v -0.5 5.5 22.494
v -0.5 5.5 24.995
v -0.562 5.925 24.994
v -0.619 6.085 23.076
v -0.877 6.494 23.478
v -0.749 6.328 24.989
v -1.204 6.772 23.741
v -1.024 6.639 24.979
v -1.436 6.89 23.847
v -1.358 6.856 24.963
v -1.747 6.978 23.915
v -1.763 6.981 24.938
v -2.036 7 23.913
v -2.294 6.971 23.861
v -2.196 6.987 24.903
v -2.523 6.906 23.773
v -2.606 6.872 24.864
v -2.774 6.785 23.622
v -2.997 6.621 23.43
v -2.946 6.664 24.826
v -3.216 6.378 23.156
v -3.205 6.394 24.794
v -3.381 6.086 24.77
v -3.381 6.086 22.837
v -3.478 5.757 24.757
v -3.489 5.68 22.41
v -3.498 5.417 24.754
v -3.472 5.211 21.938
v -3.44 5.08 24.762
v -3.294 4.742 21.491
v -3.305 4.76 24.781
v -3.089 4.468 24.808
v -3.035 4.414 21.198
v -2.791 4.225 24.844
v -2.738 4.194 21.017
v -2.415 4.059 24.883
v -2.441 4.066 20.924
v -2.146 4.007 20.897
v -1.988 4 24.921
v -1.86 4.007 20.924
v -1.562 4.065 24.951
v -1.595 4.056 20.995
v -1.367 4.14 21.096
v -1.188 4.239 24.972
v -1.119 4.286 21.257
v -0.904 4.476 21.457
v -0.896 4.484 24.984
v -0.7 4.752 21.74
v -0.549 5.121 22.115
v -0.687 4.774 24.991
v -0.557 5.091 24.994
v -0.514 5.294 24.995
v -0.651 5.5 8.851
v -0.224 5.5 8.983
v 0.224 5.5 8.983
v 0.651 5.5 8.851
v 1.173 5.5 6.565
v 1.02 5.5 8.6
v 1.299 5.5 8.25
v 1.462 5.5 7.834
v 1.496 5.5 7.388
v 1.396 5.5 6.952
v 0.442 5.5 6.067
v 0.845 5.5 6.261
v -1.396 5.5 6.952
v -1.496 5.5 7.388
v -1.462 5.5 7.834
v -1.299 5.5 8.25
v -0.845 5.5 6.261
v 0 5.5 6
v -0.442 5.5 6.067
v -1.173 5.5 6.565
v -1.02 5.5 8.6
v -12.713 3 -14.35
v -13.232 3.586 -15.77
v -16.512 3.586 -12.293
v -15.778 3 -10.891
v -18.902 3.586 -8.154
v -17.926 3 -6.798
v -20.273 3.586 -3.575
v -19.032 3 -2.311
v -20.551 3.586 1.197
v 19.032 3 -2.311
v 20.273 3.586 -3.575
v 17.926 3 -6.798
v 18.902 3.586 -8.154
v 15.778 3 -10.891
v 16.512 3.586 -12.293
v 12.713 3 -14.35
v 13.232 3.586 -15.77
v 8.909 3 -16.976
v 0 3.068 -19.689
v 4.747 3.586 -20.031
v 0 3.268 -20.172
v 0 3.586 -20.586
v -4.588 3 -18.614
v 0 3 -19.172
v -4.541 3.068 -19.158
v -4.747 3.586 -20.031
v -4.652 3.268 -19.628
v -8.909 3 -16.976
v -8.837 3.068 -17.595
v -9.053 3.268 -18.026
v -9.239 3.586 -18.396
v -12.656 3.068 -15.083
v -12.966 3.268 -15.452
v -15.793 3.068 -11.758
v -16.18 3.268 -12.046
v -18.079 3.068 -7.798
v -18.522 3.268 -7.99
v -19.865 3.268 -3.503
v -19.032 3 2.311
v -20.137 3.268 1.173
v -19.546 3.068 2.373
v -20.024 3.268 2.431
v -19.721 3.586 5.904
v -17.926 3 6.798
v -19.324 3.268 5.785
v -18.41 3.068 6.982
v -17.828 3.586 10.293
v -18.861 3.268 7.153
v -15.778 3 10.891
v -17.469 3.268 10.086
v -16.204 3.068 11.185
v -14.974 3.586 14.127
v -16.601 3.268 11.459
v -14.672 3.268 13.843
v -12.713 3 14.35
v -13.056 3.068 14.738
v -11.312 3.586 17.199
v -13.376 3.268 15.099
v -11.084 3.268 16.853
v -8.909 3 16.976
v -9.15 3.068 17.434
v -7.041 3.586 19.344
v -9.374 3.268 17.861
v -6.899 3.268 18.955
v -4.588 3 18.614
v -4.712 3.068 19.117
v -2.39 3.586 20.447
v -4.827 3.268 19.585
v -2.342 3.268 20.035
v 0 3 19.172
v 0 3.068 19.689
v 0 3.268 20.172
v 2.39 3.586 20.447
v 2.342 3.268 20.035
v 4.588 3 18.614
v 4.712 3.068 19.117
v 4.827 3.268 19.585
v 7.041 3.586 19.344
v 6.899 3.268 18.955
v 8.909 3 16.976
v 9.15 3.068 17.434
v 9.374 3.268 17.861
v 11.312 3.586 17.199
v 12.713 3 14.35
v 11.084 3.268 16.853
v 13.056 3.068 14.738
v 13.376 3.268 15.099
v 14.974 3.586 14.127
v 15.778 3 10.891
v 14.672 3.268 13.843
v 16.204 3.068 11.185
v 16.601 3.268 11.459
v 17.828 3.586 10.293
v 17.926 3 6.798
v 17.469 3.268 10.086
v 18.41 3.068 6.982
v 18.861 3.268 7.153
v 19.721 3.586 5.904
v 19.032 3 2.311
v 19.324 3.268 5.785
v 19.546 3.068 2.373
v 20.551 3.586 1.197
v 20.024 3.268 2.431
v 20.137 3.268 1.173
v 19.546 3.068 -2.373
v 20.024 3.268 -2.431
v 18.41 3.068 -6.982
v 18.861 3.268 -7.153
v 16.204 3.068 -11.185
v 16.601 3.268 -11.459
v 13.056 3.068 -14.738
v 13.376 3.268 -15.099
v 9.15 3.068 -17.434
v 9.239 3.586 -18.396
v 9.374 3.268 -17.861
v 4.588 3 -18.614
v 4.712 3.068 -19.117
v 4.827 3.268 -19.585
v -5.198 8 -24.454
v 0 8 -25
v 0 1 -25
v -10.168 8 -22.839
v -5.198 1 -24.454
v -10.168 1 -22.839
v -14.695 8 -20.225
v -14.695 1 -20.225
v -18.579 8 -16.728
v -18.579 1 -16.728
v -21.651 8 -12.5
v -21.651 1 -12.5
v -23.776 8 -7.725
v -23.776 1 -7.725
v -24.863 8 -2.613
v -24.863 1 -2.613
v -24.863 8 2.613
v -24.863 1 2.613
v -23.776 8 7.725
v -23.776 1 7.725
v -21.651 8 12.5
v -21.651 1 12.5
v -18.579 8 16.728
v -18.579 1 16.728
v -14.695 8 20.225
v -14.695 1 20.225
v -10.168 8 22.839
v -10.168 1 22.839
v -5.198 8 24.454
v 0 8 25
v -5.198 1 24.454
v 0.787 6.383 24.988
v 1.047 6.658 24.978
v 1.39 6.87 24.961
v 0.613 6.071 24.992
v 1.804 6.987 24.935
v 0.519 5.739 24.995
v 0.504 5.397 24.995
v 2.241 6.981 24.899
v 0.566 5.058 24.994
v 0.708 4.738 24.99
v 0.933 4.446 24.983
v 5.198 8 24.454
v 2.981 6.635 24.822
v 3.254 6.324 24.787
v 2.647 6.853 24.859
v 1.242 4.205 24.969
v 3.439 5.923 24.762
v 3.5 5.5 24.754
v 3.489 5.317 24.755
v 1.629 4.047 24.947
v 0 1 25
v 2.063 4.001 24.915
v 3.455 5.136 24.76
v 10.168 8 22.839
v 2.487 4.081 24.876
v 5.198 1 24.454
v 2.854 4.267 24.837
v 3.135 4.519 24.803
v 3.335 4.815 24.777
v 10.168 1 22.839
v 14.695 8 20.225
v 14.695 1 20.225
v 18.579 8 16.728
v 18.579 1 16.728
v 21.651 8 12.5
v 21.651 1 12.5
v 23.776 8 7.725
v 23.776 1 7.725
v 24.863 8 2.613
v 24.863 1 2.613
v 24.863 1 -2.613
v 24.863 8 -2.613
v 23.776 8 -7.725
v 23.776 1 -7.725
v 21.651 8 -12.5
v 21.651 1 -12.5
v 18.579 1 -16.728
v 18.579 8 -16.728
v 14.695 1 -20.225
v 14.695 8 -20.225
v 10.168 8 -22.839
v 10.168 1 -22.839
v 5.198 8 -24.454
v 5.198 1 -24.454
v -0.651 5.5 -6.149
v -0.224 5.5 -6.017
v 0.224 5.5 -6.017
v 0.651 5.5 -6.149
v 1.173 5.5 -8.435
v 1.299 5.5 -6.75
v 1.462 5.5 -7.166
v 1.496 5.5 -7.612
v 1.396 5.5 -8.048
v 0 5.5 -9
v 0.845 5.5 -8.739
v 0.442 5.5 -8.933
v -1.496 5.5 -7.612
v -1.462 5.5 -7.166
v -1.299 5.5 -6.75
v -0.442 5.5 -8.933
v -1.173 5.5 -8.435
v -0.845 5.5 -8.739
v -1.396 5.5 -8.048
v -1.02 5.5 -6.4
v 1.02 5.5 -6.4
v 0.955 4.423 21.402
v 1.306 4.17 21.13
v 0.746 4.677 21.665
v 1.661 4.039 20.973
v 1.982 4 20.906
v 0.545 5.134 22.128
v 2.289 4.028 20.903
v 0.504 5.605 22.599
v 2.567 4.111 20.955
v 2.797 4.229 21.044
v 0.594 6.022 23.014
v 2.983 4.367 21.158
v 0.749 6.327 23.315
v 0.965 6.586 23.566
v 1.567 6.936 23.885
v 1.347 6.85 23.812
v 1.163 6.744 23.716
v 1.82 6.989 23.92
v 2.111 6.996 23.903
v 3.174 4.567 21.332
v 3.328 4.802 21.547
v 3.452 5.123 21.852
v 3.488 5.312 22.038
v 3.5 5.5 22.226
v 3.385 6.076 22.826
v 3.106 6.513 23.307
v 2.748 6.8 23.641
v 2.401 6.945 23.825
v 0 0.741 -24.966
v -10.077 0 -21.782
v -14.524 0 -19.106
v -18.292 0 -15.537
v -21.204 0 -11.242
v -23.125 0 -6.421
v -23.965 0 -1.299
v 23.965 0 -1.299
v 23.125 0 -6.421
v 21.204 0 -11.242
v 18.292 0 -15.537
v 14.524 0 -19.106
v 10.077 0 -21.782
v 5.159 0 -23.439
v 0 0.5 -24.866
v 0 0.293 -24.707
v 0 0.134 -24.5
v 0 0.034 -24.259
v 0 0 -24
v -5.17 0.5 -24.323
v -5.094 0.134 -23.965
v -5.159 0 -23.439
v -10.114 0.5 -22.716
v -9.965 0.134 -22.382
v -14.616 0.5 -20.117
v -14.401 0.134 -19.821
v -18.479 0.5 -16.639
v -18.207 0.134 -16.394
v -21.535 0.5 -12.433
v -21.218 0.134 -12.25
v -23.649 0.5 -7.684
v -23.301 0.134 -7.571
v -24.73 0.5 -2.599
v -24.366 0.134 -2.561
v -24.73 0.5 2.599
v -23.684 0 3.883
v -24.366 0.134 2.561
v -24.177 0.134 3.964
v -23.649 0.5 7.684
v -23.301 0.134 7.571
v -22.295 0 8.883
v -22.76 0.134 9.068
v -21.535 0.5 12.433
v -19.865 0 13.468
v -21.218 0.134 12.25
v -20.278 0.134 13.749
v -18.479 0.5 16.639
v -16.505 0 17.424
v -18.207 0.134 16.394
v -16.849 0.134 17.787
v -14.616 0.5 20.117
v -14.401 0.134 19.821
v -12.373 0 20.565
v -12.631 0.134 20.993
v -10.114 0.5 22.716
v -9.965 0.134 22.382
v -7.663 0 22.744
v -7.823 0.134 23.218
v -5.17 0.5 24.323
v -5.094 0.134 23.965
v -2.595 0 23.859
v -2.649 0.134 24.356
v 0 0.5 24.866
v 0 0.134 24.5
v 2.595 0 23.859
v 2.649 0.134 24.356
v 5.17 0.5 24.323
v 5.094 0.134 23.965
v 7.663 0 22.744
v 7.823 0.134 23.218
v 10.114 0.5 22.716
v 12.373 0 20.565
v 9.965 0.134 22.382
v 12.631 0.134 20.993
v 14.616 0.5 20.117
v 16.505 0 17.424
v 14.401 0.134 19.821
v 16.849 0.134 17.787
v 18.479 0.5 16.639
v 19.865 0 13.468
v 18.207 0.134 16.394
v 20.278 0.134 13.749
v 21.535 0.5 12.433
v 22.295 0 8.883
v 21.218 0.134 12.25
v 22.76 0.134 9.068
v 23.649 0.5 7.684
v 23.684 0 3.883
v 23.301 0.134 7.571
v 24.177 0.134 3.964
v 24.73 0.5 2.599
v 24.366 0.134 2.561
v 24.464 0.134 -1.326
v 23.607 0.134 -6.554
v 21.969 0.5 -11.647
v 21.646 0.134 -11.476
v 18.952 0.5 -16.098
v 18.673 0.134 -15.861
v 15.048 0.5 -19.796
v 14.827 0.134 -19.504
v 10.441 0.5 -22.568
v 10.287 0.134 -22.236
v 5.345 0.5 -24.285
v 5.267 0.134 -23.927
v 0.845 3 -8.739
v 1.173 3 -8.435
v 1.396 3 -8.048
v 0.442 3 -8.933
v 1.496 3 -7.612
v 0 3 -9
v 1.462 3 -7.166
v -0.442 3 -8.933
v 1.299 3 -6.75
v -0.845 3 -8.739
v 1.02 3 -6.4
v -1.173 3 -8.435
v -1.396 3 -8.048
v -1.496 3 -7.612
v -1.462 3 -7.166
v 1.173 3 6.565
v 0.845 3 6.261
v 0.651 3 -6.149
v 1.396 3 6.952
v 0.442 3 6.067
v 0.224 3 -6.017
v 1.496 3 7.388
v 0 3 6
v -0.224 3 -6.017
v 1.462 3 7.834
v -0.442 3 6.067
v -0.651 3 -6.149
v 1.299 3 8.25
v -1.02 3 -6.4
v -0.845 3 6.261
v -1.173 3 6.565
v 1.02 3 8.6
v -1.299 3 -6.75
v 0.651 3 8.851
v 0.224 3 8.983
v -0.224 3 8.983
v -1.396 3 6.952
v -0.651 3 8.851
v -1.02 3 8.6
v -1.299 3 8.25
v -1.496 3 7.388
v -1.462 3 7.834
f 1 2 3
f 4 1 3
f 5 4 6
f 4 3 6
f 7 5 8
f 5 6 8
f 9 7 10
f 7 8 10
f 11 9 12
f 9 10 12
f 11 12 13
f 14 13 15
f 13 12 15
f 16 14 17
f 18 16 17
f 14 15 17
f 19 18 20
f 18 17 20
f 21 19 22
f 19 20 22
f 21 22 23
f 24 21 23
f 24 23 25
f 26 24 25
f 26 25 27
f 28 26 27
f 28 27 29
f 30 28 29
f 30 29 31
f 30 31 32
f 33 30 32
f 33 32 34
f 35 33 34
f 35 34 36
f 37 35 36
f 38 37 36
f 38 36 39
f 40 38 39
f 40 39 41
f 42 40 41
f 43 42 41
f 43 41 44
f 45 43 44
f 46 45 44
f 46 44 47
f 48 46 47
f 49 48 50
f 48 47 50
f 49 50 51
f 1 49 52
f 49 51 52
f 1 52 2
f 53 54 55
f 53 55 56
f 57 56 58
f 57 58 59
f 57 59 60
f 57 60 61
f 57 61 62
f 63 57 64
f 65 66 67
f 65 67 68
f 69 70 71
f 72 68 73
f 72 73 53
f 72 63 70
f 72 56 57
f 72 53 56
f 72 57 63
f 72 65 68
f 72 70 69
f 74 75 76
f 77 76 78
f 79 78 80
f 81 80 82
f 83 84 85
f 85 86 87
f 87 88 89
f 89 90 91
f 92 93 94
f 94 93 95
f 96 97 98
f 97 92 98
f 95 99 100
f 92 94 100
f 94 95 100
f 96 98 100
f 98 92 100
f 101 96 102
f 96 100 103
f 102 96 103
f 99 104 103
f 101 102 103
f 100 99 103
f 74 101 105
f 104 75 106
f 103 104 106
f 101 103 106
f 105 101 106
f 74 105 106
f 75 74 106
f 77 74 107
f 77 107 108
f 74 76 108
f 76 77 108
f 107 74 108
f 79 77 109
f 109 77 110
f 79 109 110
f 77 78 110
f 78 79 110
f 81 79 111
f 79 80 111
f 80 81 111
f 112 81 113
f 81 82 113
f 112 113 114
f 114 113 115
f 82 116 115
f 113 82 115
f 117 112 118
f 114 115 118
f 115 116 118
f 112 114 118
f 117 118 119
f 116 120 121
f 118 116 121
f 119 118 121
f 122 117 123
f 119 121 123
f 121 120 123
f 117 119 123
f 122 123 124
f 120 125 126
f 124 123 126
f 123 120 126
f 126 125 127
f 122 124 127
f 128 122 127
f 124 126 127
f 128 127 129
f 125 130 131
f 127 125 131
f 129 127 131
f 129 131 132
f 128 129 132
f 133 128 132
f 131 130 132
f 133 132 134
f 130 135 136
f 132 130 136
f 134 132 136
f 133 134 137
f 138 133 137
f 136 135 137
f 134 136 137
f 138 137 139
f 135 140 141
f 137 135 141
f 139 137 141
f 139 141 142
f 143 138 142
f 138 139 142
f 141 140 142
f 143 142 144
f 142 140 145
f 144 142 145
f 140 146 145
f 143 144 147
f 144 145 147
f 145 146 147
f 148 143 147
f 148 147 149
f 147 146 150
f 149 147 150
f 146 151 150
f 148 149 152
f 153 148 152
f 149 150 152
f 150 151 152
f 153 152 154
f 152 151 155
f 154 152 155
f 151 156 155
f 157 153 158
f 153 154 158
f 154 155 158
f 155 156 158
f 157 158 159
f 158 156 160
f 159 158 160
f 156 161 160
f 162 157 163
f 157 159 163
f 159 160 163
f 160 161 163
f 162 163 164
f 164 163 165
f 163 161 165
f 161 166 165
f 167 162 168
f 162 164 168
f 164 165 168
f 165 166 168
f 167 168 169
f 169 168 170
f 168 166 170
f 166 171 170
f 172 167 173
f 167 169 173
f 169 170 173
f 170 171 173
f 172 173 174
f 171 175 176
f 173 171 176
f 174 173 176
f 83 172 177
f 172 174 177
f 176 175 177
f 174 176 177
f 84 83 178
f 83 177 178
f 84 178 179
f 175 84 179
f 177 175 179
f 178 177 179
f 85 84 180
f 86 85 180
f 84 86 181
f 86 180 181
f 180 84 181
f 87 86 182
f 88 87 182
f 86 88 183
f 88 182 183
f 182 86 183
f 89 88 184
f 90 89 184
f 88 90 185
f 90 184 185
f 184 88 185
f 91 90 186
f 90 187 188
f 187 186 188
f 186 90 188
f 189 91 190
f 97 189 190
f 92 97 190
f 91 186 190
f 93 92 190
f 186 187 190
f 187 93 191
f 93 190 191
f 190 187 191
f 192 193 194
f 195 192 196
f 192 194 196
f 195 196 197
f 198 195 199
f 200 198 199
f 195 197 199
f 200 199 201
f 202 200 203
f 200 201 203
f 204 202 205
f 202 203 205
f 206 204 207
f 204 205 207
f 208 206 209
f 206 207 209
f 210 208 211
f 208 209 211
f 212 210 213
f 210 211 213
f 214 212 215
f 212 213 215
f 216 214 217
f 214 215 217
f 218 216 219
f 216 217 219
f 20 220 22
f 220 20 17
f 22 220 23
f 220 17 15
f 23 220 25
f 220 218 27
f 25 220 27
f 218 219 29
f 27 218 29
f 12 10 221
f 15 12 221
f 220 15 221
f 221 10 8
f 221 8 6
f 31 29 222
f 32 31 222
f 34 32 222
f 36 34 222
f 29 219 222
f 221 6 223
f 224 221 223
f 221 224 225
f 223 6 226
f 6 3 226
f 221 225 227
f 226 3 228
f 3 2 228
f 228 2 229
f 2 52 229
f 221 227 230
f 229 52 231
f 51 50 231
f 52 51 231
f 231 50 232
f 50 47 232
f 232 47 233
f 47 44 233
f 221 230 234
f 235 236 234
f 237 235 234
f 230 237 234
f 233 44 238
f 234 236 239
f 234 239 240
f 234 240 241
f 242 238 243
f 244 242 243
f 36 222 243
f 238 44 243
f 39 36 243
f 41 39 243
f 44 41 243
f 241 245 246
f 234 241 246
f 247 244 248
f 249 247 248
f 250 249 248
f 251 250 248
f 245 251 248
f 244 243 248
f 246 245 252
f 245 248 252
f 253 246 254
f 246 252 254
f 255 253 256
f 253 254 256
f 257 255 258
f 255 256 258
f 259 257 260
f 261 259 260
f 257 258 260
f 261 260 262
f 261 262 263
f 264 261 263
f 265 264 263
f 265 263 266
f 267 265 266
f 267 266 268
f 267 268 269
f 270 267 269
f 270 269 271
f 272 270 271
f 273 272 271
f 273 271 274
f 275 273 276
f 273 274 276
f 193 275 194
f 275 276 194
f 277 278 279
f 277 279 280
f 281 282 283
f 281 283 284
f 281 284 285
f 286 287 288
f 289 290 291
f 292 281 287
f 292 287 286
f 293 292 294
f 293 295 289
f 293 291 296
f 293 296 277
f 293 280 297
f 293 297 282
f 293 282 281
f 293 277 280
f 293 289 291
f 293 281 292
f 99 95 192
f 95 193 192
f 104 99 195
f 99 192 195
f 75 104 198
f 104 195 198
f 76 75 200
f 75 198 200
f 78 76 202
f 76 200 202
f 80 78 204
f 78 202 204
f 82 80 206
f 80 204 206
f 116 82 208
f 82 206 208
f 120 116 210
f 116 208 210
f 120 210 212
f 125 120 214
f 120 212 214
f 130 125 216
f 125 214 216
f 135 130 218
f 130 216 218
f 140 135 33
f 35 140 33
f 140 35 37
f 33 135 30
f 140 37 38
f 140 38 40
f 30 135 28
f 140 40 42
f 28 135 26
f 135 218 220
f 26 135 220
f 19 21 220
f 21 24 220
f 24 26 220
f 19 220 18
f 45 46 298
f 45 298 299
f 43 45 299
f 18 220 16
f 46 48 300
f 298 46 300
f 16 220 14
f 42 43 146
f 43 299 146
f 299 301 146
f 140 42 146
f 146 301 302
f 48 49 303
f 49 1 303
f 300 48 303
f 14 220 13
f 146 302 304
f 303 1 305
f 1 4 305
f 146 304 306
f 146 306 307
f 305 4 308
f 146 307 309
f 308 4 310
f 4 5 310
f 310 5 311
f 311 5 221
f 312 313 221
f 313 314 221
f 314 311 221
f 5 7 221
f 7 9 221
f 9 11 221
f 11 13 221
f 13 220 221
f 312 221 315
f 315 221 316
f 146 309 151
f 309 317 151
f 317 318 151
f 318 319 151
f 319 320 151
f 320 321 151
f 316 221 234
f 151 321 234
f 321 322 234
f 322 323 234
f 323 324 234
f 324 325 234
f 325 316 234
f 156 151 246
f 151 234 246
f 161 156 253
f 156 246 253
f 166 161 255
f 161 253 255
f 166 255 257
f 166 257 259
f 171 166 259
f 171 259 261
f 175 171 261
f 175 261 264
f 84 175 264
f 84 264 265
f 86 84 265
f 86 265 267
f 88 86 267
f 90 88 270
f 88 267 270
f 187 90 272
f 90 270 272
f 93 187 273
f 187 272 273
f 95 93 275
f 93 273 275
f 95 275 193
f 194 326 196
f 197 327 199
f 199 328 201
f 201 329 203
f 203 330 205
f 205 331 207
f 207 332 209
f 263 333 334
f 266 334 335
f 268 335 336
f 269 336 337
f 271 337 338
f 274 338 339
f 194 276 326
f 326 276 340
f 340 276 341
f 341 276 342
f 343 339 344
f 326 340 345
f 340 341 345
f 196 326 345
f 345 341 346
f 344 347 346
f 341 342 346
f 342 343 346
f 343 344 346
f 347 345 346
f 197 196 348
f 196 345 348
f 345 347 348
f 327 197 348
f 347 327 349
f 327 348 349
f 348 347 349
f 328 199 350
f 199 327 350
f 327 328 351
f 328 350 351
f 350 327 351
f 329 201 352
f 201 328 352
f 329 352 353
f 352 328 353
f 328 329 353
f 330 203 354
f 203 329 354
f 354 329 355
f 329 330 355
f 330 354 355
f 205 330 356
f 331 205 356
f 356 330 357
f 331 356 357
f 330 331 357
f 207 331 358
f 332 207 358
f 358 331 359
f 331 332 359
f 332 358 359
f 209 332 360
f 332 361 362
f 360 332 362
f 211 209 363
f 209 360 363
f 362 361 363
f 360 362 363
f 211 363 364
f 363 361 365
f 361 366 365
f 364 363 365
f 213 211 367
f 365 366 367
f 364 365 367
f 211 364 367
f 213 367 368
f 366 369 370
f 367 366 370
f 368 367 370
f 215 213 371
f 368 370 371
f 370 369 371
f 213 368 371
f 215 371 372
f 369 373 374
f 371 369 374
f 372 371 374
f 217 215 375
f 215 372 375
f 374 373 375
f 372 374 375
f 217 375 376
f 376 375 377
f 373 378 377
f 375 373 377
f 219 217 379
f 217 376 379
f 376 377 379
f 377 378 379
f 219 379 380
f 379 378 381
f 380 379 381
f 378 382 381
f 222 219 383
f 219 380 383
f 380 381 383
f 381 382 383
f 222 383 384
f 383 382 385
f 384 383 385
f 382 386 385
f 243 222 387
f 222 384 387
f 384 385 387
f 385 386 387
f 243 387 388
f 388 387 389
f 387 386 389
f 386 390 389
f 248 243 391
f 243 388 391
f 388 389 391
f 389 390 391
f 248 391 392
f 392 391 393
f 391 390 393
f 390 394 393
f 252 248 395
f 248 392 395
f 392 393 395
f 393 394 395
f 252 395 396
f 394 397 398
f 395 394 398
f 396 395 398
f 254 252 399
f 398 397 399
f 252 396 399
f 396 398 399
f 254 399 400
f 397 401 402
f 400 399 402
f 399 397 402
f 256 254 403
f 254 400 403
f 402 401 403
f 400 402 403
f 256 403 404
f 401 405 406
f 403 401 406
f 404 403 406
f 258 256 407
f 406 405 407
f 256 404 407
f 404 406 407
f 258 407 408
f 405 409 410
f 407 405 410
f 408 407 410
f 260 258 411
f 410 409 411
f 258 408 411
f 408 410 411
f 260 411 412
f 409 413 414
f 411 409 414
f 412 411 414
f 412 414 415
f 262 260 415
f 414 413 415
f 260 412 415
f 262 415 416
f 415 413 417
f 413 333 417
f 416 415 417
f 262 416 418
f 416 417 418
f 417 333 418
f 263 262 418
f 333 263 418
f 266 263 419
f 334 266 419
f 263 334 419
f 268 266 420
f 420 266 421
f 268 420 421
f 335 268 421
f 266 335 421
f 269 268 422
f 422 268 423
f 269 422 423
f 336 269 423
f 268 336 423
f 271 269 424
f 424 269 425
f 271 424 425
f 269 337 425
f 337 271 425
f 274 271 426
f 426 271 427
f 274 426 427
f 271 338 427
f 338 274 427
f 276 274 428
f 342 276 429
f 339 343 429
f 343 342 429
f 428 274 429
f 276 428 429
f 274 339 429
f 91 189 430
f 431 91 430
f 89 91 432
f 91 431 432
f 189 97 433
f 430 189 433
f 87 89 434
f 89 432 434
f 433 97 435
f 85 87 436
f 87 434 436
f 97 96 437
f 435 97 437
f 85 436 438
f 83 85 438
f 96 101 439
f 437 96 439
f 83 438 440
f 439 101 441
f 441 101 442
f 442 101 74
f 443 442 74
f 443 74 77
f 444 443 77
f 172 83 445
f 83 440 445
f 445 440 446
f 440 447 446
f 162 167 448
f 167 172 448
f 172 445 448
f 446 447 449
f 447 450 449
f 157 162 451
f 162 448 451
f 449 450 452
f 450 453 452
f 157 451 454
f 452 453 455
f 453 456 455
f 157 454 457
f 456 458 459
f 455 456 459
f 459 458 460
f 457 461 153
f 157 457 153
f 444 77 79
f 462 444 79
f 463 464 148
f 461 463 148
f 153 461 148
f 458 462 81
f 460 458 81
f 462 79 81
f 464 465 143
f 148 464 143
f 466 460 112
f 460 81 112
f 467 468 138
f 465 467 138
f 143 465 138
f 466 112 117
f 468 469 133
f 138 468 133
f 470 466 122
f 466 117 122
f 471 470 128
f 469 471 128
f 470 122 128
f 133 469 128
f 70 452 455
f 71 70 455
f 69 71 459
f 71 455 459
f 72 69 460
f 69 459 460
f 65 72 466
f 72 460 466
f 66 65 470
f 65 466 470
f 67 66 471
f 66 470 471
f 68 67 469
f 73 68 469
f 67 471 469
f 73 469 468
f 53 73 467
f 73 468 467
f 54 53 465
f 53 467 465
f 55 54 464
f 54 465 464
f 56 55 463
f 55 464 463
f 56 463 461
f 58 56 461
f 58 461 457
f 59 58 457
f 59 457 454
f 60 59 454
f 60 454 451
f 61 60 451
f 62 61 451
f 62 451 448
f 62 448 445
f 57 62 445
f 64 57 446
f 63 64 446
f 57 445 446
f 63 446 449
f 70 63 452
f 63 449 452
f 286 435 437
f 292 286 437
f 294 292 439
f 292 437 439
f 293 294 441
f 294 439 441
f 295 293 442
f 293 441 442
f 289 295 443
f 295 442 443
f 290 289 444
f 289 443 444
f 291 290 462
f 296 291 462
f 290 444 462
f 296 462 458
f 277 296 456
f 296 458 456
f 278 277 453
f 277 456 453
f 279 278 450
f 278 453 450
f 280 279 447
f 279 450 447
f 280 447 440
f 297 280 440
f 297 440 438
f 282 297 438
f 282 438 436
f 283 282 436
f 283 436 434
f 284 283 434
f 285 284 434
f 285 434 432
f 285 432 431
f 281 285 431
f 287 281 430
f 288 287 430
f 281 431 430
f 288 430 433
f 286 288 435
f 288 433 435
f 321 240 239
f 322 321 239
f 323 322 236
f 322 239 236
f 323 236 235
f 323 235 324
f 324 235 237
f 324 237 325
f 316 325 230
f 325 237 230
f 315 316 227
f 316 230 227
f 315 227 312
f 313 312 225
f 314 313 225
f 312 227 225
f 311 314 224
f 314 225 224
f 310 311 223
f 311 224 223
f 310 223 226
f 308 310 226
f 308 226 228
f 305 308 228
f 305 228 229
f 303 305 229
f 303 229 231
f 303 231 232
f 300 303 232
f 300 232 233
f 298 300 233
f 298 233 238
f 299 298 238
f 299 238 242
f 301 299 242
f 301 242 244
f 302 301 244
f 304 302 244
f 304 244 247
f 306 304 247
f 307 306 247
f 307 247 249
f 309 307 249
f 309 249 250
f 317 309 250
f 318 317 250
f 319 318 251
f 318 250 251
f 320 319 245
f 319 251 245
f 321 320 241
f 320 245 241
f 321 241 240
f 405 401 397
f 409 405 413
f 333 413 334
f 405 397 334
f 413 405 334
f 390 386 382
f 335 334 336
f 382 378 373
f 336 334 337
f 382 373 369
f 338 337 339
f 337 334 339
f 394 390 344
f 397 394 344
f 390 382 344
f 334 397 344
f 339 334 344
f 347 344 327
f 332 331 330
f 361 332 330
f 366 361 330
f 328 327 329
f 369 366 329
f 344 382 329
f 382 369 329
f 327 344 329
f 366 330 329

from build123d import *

# Parameters (mm, degrees)
CUT_EXTRUDE1_REACH  = 58.471
SKETCH5_R           = 1.5
SKETCH6_R           = 1.5
BOSS_EXTRUDE1_DEPTH = 2.5


with BuildPart() as part:
    # Sketch3 → Revolve3 (revolve)
    with BuildSketch(Plane.XY, mode=Mode.PRIVATE) as revolve3_sk:
        with BuildLine():
            Line((-23, 0), (0, 0))
            Line((0, 0), (0, 3))
            Line((0, 3), (-19.171572875, 3))
            ThreePointArc((-19.171572875, 3), (-19.93693974, 3.152240935), (-20.585786438, 3.585786438))
            Line((-20.585786438, 3.585786438), (-25, 8))
            Line((-25, 8), (-25, 1))
            ThreePointArc((-25, 1), (-24.707106781, 0.292893219), (-24, 0))
            Line((-24, 0), (-23, 0))
        make_face()
    revolve(revolve3_sk.sketch.rotate(Axis((0, 0, 0), (0, 1, 0)), 270), axis=Axis((0, 0, 0), (0, 1, 0)))

    # Cut-Extrude1: up to this cone (the profile starts outside it)
    cut_extrude1_end = Plane(origin=(0, 5.5, 0), z_dir=(0, 1, 0)).offset(-22.499999) * Cone(1e-06, 103.971, 103.970999, align=(Align.CENTER, Align.CENTER, Align.MIN), mode=Mode.PRIVATE)
    # Sketch5 → Cut-Extrude1 (cut, up to the surface)
    with BuildSketch(Plane.XY.offset(25), mode=Mode.PRIVATE) as cut_extrude1_sk1:
        with Locations((-2, 5.5)):
            Circle(SKETCH5_R)
    cut_extrude1_tool1 = extrude(cut_extrude1_sk1.sketch, amount=-CUT_EXTRUDE1_REACH, mode=Mode.PRIVATE) - cut_extrude1_end
    add(cut_extrude1_tool1.solids().sort_by_distance((-2, 5.5, 25))[0], mode=Mode.SUBTRACT)
    # Sketch5 → Cut-Extrude1 (cut, up to the surface)
    with BuildSketch(Plane.XY.offset(25), mode=Mode.PRIVATE) as cut_extrude1_sk2:
        with Locations((2, 5.5)):
            Circle(SKETCH5_R)
    cut_extrude1_tool2 = extrude(cut_extrude1_sk2.sketch, amount=-CUT_EXTRUDE1_REACH, mode=Mode.PRIVATE) - cut_extrude1_end
    add(cut_extrude1_tool2.solids().sort_by_distance((2, 5.5, 25))[0], mode=Mode.SUBTRACT)

    # Sketch6 → Boss-Extrude1 (add)
    with BuildSketch(Plane(origin=(0, 3, 0), x_dir=(1, 0, 0), z_dir=(0, 1, 0))):
        with Locations(Location((0, 7.5, 0), (0, 0, 90))):
            Circle(SKETCH6_R)
        with Locations(Location((0, -7.5, 0), (0, 0, 90))):
            Circle(SKETCH6_R)
    extrude(amount=BOSS_EXTRUDE1_DEPTH)


solid = part.part
